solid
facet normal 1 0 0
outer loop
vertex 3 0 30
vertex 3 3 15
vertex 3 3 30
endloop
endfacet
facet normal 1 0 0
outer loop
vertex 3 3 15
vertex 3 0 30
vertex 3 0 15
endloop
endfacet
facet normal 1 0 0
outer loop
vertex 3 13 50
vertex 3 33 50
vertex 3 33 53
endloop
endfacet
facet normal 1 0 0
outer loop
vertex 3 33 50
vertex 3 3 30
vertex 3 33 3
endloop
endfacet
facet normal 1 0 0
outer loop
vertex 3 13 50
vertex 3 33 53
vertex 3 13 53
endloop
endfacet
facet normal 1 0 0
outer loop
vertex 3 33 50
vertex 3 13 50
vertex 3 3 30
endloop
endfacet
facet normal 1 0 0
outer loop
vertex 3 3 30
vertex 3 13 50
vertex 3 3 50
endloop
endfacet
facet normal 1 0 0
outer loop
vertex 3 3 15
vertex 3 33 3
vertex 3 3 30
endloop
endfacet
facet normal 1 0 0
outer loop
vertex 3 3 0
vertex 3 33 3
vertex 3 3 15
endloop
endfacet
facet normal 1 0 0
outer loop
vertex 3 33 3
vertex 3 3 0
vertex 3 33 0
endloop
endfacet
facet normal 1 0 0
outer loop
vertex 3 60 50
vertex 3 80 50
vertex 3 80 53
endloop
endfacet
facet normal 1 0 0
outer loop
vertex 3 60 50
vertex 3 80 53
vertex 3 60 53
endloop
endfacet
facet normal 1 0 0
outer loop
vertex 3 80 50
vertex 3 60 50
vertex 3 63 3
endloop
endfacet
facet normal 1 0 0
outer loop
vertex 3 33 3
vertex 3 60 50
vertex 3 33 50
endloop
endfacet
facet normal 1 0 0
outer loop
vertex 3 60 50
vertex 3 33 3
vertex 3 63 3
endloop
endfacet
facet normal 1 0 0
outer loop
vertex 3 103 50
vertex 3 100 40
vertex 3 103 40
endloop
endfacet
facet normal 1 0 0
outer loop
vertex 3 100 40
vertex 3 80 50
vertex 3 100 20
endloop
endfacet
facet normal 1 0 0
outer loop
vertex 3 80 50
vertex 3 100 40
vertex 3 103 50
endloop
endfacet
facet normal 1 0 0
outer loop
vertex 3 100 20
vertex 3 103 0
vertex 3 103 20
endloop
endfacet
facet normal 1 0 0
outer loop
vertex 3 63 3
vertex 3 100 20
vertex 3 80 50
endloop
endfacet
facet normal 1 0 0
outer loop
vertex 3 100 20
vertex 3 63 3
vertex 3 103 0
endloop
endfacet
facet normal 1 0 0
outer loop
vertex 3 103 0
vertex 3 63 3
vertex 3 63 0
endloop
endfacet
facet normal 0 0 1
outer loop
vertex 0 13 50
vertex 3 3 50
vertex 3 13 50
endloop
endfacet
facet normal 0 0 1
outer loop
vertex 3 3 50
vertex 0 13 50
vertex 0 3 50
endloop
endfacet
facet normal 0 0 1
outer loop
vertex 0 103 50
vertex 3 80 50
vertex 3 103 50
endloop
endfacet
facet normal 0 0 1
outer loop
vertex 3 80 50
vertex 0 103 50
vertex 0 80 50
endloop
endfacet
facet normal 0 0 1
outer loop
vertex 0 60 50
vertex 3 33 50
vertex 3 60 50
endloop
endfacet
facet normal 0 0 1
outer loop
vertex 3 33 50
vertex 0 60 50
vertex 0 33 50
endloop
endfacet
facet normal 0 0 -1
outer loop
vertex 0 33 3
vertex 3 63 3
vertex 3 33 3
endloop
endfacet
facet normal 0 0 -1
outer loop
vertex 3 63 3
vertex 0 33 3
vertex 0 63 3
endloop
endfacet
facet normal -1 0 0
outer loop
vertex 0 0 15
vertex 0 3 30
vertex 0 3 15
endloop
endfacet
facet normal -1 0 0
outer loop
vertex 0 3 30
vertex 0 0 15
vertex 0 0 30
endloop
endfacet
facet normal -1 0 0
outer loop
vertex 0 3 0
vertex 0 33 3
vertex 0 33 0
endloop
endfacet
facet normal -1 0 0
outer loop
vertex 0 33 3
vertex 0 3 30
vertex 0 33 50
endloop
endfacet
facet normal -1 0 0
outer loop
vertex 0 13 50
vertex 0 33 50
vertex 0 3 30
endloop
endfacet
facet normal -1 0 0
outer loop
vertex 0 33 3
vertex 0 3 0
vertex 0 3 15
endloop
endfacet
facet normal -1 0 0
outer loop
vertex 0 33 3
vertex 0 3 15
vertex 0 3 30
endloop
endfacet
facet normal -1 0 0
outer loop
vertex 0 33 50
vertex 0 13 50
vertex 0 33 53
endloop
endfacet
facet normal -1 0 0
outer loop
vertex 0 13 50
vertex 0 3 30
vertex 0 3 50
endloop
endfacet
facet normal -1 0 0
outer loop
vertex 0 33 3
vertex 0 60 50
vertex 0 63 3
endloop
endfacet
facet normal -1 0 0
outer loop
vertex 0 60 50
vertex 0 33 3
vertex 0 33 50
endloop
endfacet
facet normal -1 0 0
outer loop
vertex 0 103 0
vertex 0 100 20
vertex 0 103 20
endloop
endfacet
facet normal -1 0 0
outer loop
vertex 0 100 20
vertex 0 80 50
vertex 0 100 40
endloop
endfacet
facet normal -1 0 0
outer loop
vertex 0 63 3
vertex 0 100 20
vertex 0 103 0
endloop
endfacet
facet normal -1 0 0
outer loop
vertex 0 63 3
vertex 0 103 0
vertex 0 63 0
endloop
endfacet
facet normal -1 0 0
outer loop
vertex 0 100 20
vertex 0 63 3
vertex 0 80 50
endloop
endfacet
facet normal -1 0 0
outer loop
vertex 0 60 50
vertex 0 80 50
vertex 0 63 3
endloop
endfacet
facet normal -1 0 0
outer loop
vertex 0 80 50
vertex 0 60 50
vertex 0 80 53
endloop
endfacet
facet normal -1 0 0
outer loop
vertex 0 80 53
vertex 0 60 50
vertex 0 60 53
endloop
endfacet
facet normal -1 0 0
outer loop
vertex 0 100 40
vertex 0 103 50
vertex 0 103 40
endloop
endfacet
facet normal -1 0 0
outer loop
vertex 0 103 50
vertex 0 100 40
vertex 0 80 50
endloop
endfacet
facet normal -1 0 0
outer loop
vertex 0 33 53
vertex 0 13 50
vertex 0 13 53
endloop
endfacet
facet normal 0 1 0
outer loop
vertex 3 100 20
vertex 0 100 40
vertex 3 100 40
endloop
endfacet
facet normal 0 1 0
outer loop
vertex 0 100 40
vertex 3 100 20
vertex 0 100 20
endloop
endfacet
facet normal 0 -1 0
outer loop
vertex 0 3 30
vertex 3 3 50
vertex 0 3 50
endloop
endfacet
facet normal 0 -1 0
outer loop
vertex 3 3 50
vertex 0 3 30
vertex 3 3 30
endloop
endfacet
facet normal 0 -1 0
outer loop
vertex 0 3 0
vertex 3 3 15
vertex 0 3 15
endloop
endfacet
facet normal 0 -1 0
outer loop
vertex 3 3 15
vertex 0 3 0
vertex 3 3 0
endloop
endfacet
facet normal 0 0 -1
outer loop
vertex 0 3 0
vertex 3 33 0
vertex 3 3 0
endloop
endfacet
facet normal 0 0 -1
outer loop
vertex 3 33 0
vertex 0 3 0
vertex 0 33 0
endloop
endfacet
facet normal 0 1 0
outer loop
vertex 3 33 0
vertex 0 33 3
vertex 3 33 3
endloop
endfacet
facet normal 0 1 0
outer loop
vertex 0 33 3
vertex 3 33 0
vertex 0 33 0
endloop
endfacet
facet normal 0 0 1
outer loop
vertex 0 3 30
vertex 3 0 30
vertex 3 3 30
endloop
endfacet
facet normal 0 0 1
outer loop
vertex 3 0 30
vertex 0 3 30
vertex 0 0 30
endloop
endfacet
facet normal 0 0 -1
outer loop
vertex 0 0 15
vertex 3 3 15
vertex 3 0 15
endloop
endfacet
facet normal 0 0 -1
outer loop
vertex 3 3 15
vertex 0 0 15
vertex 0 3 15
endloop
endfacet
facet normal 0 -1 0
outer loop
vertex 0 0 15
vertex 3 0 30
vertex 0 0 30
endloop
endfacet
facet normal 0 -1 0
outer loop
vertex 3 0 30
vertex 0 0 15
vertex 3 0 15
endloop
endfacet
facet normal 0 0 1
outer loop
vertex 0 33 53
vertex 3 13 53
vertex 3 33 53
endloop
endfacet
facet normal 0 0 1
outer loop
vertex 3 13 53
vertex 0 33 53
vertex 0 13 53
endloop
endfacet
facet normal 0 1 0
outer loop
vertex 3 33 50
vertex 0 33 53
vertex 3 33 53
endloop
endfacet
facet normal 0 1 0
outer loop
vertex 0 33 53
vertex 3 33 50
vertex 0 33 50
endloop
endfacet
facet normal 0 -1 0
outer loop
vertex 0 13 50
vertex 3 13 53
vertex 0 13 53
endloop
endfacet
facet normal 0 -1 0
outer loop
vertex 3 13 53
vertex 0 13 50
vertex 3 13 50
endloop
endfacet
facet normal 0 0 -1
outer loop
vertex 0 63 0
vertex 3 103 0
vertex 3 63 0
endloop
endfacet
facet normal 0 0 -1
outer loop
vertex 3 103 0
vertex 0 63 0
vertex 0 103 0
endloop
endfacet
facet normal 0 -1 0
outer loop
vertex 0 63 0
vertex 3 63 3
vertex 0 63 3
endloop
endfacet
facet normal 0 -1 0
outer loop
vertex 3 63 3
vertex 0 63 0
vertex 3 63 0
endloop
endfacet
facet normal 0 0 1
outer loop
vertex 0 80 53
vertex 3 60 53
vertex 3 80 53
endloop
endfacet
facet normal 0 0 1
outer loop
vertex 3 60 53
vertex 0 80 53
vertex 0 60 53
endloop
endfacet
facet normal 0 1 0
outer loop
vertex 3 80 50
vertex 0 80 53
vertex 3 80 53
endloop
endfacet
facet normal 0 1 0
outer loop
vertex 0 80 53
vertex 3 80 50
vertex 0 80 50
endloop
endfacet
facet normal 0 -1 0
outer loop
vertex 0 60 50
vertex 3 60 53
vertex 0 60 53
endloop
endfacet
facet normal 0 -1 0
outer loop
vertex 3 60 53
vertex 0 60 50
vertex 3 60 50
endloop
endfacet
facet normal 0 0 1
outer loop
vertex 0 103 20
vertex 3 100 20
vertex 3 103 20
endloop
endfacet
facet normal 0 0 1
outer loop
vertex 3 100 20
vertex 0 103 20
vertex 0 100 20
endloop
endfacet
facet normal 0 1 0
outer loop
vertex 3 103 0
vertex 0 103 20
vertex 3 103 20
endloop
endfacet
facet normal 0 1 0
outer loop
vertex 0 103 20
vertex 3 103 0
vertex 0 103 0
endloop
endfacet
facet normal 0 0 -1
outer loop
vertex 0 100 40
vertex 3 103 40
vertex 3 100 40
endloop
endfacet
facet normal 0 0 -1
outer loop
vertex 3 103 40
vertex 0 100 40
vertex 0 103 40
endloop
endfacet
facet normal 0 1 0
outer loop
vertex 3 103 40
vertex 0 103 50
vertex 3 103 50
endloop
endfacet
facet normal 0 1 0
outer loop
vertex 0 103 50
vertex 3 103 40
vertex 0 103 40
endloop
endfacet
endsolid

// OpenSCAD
module part03a (){
    
    // base form
    translate([0,3,3] )color ("orange") cube([3,97,47]);
    
    // pin unten vorne
    translate([0,3,0]) color ("orange") cube([3,30,3]);
    
    // pin vorderseite
    translate([0,0,15]) color ("orange") cube([3,3,15]);
   
    
    // pin oben vorne
    translate([0,13,50]) color ("orange") cube([3,20,3]);
    
    //pin unten hinten
    translate([0,63,0] )color ("orange") cube([3,37,3]);
    
    
    // pin oben hinten
    translate([0,60,50])color ("orange") cube([3,20,3]);
    
    // connector part03 unten
    translate([0,100,0]) color ("orange") cube([3,3,20]);
    
    // connector part03 oben
    translate([0,100,40]) color ("orange") cube([3,3,10]);
}

part03a();
